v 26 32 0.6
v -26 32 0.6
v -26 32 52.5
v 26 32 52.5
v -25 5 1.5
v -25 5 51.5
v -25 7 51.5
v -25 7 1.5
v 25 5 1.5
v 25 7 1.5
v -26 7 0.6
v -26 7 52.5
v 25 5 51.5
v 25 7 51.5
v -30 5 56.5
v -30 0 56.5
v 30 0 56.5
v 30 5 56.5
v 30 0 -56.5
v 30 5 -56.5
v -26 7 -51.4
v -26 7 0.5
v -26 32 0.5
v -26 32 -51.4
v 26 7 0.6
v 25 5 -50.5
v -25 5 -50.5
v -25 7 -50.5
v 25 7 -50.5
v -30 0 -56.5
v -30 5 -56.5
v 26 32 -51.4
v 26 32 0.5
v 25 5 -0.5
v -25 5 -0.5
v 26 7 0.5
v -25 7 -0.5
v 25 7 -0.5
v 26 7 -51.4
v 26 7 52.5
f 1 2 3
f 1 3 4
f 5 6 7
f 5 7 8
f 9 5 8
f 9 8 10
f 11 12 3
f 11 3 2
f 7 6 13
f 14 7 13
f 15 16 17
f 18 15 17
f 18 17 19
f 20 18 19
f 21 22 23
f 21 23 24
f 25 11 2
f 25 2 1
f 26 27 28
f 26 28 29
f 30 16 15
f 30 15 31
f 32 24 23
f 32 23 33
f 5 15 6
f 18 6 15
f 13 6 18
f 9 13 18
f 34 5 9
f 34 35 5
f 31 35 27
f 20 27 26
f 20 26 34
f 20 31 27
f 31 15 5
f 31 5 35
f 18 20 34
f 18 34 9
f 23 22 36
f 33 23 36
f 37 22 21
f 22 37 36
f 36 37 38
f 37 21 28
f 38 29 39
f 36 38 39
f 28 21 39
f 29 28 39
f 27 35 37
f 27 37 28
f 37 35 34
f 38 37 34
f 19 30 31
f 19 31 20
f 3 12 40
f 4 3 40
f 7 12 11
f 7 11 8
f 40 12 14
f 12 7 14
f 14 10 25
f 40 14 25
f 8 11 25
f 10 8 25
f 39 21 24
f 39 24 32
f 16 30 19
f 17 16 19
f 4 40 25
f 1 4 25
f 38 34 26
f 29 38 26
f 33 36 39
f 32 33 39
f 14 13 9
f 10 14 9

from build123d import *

# Parameters (mm, degrees)
SKETCH1_W           = 60
SKETCH1_H           = 113
BOSS_EXTRUDE1_DEPTH = 5
SKETCH2_W           = 50
SKETCH2_H           = 50
BOSS_EXTRUDE3_DEPTH = 2
LPATTERN1_COUNT     = 2
LPATTERN1_PITCH     = 52
SKETCH3_W           = 52
SKETCH3_H           = 51.9
BOSS_EXTRUDE8_DEPTH = 25
LPATTERN5_COUNT     = 2
LPATTERN5_PITCH     = 52


with BuildPart() as part:
    # Sketch1 → Boss-Extrude1 (new body)
    with BuildSketch(Plane(origin=(0, 0, 0), x_dir=(1, 0, 0), z_dir=(0, 1, 0))):
        Rectangle(SKETCH1_W, SKETCH1_H)
    extrude(amount=BOSS_EXTRUDE1_DEPTH)

    # Sketch2 → Boss-Extrude3 (add)
    with BuildSketch(Plane(origin=(0, 5, 0), x_dir=(1, 0, 0), z_dir=(0, 1, 0))):
        with Locations((0, -26.5)):
            Rectangle(SKETCH2_W, SKETCH2_H)
    boss_extrude3 = extrude(amount=BOSS_EXTRUDE3_DEPTH)

    # LPattern1: Boss-Extrude3 ×2
    with Locations(*[(0, 0, -i * LPATTERN1_PITCH) for i in range(1, LPATTERN1_COUNT)]):
        add(boss_extrude3)

    # Sketch3 → Boss-Extrude8 (add)
    with BuildSketch(Plane(origin=(0, 7, 0), x_dir=(1, 0, 0), z_dir=(0, 1, 0))):
        with Locations((0, -26.55)):
            Rectangle(SKETCH3_W, SKETCH3_H)
    boss_extrude8 = extrude(amount=BOSS_EXTRUDE8_DEPTH)

    # LPattern5: Boss-Extrude8 ×2
    with Locations(*[(0, 0, -i * LPATTERN5_PITCH) for i in range(1, LPATTERN5_COUNT)]):
        add(boss_extrude8)


solid = part.part
